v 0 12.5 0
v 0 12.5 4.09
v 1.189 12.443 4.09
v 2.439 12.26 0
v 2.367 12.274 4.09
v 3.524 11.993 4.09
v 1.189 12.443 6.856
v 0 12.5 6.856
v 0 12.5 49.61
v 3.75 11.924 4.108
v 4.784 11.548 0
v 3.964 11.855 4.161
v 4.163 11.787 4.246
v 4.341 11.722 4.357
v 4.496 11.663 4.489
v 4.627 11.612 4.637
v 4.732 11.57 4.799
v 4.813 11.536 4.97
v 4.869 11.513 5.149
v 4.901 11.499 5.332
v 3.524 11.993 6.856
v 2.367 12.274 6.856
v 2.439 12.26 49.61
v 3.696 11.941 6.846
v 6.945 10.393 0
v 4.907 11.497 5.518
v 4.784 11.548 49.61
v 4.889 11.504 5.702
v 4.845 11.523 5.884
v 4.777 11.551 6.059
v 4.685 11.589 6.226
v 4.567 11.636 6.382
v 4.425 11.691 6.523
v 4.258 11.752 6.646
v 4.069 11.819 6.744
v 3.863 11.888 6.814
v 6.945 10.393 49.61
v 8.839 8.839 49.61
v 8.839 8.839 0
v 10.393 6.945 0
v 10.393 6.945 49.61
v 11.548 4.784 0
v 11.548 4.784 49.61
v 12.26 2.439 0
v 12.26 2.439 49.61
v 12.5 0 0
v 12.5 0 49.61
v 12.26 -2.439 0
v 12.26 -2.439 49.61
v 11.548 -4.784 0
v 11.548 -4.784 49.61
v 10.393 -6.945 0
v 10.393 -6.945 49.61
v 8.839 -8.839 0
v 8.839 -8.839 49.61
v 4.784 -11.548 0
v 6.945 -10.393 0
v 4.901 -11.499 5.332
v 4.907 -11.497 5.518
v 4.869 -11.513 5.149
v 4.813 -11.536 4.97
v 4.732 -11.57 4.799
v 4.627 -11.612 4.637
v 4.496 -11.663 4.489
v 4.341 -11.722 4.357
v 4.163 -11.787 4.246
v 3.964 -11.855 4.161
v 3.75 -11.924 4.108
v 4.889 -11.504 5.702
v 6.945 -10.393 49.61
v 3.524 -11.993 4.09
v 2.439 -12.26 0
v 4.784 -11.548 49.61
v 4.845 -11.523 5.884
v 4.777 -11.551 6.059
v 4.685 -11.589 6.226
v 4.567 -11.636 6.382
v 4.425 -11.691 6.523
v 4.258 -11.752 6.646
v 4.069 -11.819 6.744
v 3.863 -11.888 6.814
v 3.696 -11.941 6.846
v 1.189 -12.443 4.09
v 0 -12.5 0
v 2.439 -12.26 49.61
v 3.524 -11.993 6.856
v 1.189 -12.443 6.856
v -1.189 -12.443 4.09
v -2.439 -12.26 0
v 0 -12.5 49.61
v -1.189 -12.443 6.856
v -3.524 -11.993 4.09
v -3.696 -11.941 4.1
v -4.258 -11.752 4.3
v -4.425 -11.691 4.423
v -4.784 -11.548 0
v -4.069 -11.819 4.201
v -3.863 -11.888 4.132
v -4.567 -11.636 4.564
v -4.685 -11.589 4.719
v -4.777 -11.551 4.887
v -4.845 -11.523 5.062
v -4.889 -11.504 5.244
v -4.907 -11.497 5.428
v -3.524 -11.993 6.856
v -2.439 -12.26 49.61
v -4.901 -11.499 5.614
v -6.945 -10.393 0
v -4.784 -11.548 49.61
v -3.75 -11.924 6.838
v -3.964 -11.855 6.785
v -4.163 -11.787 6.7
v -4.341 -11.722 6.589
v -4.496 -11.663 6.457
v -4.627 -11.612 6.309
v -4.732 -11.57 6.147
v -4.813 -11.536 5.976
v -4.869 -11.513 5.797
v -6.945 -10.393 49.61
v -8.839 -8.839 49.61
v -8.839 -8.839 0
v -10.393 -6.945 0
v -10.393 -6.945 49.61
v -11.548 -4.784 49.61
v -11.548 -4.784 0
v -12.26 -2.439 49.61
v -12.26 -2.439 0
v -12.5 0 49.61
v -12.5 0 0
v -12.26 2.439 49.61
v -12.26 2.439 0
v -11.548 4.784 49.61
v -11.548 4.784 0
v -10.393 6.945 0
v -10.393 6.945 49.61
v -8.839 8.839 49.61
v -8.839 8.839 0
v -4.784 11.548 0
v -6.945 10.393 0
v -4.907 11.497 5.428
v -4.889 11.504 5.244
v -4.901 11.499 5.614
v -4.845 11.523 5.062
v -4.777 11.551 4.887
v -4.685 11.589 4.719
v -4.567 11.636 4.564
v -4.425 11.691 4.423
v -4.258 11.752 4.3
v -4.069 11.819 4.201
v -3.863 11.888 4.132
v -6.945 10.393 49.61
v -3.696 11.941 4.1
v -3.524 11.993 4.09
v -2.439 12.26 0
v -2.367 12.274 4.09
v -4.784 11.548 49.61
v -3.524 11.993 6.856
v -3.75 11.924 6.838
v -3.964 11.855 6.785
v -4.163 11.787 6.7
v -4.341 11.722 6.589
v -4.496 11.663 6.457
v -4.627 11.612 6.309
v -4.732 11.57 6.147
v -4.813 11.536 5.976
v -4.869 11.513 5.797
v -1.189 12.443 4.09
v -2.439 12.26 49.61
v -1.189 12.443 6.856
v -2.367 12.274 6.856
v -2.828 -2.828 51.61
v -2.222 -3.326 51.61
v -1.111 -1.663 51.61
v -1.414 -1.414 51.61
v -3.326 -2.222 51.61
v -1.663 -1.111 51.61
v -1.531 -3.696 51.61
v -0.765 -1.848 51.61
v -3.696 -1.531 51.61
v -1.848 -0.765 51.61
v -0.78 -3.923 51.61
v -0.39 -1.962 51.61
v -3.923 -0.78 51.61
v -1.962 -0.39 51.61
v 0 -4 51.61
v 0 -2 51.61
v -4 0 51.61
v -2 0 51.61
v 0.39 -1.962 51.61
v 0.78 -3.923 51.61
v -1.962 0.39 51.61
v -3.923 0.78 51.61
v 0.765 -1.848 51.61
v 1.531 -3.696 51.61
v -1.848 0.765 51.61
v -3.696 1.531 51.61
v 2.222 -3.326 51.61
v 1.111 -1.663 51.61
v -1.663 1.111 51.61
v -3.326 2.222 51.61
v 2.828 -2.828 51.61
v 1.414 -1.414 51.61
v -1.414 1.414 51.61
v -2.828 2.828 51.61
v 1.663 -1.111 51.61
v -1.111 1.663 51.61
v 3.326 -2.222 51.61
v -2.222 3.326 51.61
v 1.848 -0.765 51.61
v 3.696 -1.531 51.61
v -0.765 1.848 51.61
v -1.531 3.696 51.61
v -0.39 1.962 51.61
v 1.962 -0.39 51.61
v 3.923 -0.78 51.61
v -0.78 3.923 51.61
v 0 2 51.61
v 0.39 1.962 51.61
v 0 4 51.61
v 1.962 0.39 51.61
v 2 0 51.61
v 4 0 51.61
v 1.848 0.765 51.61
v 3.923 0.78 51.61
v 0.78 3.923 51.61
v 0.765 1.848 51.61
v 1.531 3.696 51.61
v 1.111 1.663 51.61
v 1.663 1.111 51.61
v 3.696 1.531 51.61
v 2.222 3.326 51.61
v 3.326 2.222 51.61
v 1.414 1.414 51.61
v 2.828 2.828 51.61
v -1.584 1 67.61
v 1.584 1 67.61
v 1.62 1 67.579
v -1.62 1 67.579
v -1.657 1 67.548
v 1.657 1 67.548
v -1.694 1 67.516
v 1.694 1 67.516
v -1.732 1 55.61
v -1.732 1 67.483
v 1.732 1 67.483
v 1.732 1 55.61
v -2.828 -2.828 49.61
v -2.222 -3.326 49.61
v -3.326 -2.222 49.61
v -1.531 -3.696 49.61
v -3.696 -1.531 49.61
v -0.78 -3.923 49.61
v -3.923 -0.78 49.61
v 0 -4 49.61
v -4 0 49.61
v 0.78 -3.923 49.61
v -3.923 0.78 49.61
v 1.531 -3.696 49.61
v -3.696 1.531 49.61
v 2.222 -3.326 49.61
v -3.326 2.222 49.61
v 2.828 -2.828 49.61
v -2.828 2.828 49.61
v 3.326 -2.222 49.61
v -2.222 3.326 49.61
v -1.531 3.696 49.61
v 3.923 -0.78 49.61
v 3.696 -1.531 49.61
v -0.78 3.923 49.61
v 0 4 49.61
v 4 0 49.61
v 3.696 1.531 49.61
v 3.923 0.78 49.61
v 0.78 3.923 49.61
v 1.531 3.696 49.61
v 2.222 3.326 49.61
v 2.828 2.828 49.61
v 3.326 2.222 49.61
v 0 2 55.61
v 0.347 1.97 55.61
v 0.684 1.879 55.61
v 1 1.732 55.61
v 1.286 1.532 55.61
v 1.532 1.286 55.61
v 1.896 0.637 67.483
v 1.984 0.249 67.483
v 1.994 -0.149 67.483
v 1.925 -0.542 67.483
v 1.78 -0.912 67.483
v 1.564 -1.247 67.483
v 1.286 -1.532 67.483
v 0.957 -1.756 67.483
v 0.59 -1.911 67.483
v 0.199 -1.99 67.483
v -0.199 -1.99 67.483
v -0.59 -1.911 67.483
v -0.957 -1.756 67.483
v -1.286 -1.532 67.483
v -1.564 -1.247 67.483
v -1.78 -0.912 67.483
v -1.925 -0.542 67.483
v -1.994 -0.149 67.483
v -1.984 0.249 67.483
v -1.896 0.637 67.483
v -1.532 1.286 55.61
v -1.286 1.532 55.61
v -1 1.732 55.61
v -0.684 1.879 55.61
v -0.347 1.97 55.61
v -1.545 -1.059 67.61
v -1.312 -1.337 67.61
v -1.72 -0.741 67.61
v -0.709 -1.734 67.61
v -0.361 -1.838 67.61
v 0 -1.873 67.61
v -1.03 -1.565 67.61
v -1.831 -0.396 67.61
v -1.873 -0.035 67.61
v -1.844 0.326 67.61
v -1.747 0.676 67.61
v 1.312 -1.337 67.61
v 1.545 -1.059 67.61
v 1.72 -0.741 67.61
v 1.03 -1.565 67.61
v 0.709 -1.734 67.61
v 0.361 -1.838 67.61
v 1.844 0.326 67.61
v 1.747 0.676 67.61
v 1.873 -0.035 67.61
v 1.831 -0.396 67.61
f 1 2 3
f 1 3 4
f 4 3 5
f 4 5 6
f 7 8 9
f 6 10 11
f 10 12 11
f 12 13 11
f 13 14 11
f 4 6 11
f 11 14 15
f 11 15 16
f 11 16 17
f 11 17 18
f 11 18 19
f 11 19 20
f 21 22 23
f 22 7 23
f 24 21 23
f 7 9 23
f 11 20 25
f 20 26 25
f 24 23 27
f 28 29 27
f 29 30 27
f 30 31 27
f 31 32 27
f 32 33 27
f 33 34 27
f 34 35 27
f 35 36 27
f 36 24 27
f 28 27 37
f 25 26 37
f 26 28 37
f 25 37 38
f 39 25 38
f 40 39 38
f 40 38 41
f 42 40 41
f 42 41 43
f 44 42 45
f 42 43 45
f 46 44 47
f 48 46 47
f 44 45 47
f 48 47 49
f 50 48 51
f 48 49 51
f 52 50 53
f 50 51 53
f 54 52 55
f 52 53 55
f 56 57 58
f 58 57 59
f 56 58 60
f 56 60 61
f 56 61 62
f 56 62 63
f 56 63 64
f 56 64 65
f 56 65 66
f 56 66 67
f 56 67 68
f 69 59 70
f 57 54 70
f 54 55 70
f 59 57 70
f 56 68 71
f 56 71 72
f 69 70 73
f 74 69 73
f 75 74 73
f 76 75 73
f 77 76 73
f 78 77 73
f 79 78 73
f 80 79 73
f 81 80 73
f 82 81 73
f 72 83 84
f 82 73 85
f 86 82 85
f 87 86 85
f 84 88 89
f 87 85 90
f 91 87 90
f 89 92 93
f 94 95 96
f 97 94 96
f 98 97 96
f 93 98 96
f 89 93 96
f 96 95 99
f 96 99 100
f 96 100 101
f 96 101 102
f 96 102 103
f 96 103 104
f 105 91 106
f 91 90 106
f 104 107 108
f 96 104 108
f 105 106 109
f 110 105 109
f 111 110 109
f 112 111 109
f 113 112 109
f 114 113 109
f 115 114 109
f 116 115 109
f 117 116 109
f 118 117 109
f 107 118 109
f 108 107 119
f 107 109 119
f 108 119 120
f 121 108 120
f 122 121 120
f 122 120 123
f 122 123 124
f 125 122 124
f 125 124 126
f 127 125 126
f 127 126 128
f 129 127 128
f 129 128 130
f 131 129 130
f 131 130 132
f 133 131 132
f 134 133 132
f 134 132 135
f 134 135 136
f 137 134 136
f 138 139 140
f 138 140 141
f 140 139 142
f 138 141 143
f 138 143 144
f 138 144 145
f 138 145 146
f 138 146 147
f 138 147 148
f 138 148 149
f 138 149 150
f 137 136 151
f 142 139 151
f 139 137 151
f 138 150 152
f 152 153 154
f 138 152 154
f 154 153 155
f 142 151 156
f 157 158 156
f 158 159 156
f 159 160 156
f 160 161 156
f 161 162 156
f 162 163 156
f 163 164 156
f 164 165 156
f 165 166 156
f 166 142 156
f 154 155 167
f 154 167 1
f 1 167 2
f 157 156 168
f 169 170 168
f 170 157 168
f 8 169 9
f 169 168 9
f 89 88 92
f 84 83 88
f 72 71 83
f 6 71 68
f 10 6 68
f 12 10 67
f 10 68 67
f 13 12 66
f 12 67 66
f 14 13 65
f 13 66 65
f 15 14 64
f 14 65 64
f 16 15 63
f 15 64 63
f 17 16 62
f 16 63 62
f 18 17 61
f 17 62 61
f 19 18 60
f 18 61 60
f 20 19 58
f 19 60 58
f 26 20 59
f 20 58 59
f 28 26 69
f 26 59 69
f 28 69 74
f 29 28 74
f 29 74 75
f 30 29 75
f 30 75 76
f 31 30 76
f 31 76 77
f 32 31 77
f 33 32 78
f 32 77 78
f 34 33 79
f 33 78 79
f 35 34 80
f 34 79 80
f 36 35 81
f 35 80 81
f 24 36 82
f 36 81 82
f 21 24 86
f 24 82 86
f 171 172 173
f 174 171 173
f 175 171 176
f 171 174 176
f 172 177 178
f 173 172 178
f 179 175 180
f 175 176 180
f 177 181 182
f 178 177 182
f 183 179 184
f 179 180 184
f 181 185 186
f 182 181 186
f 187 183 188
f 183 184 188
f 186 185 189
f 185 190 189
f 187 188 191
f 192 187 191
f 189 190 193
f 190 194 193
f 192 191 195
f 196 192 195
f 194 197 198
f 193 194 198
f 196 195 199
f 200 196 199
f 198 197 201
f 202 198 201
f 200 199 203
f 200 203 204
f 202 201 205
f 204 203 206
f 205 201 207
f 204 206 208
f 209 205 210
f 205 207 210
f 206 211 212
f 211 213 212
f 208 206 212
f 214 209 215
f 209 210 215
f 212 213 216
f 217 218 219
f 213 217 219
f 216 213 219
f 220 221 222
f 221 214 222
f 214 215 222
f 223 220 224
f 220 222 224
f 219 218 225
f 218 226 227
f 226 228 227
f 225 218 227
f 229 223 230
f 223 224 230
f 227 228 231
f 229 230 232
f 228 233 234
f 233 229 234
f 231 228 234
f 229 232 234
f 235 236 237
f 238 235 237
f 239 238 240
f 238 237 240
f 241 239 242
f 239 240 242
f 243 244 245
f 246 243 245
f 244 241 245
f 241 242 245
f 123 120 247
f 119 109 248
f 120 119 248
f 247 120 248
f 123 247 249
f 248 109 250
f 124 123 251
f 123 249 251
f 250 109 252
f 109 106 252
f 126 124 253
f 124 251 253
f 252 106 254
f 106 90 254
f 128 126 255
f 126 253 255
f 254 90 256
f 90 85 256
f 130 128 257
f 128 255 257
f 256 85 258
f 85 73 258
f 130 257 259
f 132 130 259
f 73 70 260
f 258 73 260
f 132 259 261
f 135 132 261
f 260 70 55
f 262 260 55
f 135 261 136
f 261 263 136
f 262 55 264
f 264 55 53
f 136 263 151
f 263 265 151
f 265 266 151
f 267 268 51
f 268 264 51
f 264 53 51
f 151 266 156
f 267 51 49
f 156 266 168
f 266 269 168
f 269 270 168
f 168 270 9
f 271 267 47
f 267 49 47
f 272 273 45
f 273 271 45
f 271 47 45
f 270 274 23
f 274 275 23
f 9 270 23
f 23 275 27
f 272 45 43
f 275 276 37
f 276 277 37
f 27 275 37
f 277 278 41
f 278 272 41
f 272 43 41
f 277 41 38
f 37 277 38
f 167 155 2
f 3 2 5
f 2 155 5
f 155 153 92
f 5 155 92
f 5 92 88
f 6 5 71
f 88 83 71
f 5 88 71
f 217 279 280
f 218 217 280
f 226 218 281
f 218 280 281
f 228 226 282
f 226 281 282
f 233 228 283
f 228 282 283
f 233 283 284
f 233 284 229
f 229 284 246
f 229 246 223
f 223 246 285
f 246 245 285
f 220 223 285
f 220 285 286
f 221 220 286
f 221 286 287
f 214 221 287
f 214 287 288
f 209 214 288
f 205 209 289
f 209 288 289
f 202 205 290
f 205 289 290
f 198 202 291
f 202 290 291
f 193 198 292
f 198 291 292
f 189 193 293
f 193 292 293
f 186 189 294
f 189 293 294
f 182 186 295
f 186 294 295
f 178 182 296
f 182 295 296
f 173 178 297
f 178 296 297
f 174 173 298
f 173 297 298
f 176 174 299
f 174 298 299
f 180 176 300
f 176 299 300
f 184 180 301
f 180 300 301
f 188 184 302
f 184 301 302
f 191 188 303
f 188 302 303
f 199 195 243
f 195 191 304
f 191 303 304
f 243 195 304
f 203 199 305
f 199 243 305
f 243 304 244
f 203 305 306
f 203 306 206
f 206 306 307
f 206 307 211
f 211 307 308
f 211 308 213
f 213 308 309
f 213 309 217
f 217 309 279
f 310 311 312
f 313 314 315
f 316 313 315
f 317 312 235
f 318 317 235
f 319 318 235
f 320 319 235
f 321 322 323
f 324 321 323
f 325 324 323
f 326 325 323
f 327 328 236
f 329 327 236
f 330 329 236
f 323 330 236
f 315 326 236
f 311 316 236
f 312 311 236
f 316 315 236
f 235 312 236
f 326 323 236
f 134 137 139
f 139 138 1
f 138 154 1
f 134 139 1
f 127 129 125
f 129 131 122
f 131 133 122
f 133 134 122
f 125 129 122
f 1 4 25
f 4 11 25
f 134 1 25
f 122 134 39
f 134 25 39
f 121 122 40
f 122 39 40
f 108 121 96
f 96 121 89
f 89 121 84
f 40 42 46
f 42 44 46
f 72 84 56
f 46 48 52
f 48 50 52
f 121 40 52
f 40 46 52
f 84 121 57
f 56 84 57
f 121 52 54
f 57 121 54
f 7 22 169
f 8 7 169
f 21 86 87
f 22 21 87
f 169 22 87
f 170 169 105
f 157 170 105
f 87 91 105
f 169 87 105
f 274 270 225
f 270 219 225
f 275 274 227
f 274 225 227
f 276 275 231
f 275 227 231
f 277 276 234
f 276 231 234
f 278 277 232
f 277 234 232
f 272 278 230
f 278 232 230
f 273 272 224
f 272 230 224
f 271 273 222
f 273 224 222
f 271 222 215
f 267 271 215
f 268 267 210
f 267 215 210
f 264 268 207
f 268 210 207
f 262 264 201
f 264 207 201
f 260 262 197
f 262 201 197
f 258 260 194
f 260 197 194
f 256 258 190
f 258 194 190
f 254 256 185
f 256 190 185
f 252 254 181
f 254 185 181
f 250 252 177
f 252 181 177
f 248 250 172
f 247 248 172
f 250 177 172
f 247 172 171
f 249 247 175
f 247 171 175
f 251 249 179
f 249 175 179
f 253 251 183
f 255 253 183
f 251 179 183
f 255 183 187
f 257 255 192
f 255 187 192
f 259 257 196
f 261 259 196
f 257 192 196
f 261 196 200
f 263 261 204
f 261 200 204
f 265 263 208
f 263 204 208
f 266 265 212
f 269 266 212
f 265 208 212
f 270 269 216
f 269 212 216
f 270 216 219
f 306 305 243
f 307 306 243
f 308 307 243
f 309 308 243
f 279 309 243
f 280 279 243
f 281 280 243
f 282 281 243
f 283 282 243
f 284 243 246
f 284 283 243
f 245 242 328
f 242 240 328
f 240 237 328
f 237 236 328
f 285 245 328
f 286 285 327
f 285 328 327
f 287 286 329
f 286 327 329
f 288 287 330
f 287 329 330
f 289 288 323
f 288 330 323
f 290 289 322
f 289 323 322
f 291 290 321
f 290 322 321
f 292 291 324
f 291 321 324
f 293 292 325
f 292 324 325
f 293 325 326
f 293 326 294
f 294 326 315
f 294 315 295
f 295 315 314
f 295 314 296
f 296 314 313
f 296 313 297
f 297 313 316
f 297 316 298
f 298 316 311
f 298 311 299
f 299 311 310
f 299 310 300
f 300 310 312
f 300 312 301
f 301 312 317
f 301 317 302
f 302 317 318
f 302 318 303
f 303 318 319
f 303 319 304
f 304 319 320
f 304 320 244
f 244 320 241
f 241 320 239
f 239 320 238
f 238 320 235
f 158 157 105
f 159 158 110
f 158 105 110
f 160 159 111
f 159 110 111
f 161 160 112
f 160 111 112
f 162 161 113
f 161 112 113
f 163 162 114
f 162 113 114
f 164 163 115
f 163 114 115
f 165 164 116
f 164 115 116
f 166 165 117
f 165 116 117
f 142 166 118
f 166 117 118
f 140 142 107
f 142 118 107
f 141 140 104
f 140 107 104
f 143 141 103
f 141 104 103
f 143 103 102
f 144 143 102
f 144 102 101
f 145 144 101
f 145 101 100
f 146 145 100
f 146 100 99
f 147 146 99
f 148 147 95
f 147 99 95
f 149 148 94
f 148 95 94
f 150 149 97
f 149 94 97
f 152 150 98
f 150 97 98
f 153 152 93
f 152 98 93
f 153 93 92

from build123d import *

# Parameters (mm, degrees)
F2_W     = 3.4641016151
F2_H     = 1
F3_DEPTH = 12
F4_SIZE  = 0.127
F6_DEPTH = 76.2


with BuildPart() as f1:
    # F0 (on Right) → F1 (revolve)
    with BuildSketch(Plane.YZ):
        Polygon((0, 67.61), (0, 0), (12.5, 0), (12.5, 49.61), (4, 49.61), (4, 51.61), (2, 51.61), (2, 67.61), align=None)
    revolve(axis=Axis((0, 0, 33.805), (0, 0, -1)))

    # F2 (on face) → F3 (cut)
    with BuildSketch(Plane.XY.offset(67.61)):
        with Locations((0, 1.5)):
            Rectangle(F2_W, F2_H)
    extrude(amount=-F3_DEPTH, mode=Mode.SUBTRACT)

    # F4
    f4_edges = [f1.edges().sort_by_distance(p)[0] for p in [
        (0, -2, 67.61),
    ]]
    chamfer(f4_edges, length=F4_SIZE)

    # F5 (on Front) → F6 (cut, symmetric)
    with BuildSketch(Plane.XZ):
        with BuildLine():
            ThreePointArc((-2.1409534384, 5.472927049), (-2.5461377058, 6.4511284027), (-3.5243390594, 6.8563126701))
            Line((-3.5243390594, 6.8563126701), (-3.5243390594, 4.089541428))
            ThreePointArc((-3.5243390594, 4.089541428), (-2.5461377058, 4.4947256954), (-2.1409534384, 5.472927049))
        make_face()
        with BuildLine():
            Line((3.5243390594, 6.8563126701), (-3.5243390594, 6.8563126701))
            ThreePointArc((-3.5243390594, 6.8563126701), (-2.5461377058, 6.4511284027), (-2.1409534384, 5.472927049))
            ThreePointArc((-2.1409534384, 5.472927049), (-2.5461377058, 4.4947256954), (-3.5243390594, 4.089541428))
            Line((-3.5243390594, 4.089541428), (3.5243390594, 4.089541428))
            ThreePointArc((3.5243390594, 4.089541428), (2.1409534384, 5.472927049), (3.5243390594, 6.8563126701))
        make_face()
        with BuildLine():
            Line((-3.5243390594, 4.089541428), (-3.5243390594, 6.8563126701))
            ThreePointArc((-3.5243390594, 6.8563126701), (-4.9077246804, 5.472927049), (-3.5243390594, 4.089541428))
        make_face()
        with BuildLine():
            ThreePointArc((4.9077246804, 5.472927049), (4.502540413, 6.4511284027), (3.5243390594, 6.8563126701))
            Line((3.5243390594, 6.8563126701), (3.5243390594, 4.089541428))
            ThreePointArc((3.5243390594, 4.089541428), (4.502540413, 4.4947256954), (4.9077246804, 5.472927049))
        make_face()
        with BuildLine():
            Line((3.5243390594, 4.089541428), (3.5243390594, 6.8563126701))
            ThreePointArc((3.5243390594, 6.8563126701), (2.1409534384, 5.472927049), (3.5243390594, 4.089541428))
        make_face()
    extrude(amount=F6_DEPTH, both=True, mode=Mode.SUBTRACT)


solid = f1.part
